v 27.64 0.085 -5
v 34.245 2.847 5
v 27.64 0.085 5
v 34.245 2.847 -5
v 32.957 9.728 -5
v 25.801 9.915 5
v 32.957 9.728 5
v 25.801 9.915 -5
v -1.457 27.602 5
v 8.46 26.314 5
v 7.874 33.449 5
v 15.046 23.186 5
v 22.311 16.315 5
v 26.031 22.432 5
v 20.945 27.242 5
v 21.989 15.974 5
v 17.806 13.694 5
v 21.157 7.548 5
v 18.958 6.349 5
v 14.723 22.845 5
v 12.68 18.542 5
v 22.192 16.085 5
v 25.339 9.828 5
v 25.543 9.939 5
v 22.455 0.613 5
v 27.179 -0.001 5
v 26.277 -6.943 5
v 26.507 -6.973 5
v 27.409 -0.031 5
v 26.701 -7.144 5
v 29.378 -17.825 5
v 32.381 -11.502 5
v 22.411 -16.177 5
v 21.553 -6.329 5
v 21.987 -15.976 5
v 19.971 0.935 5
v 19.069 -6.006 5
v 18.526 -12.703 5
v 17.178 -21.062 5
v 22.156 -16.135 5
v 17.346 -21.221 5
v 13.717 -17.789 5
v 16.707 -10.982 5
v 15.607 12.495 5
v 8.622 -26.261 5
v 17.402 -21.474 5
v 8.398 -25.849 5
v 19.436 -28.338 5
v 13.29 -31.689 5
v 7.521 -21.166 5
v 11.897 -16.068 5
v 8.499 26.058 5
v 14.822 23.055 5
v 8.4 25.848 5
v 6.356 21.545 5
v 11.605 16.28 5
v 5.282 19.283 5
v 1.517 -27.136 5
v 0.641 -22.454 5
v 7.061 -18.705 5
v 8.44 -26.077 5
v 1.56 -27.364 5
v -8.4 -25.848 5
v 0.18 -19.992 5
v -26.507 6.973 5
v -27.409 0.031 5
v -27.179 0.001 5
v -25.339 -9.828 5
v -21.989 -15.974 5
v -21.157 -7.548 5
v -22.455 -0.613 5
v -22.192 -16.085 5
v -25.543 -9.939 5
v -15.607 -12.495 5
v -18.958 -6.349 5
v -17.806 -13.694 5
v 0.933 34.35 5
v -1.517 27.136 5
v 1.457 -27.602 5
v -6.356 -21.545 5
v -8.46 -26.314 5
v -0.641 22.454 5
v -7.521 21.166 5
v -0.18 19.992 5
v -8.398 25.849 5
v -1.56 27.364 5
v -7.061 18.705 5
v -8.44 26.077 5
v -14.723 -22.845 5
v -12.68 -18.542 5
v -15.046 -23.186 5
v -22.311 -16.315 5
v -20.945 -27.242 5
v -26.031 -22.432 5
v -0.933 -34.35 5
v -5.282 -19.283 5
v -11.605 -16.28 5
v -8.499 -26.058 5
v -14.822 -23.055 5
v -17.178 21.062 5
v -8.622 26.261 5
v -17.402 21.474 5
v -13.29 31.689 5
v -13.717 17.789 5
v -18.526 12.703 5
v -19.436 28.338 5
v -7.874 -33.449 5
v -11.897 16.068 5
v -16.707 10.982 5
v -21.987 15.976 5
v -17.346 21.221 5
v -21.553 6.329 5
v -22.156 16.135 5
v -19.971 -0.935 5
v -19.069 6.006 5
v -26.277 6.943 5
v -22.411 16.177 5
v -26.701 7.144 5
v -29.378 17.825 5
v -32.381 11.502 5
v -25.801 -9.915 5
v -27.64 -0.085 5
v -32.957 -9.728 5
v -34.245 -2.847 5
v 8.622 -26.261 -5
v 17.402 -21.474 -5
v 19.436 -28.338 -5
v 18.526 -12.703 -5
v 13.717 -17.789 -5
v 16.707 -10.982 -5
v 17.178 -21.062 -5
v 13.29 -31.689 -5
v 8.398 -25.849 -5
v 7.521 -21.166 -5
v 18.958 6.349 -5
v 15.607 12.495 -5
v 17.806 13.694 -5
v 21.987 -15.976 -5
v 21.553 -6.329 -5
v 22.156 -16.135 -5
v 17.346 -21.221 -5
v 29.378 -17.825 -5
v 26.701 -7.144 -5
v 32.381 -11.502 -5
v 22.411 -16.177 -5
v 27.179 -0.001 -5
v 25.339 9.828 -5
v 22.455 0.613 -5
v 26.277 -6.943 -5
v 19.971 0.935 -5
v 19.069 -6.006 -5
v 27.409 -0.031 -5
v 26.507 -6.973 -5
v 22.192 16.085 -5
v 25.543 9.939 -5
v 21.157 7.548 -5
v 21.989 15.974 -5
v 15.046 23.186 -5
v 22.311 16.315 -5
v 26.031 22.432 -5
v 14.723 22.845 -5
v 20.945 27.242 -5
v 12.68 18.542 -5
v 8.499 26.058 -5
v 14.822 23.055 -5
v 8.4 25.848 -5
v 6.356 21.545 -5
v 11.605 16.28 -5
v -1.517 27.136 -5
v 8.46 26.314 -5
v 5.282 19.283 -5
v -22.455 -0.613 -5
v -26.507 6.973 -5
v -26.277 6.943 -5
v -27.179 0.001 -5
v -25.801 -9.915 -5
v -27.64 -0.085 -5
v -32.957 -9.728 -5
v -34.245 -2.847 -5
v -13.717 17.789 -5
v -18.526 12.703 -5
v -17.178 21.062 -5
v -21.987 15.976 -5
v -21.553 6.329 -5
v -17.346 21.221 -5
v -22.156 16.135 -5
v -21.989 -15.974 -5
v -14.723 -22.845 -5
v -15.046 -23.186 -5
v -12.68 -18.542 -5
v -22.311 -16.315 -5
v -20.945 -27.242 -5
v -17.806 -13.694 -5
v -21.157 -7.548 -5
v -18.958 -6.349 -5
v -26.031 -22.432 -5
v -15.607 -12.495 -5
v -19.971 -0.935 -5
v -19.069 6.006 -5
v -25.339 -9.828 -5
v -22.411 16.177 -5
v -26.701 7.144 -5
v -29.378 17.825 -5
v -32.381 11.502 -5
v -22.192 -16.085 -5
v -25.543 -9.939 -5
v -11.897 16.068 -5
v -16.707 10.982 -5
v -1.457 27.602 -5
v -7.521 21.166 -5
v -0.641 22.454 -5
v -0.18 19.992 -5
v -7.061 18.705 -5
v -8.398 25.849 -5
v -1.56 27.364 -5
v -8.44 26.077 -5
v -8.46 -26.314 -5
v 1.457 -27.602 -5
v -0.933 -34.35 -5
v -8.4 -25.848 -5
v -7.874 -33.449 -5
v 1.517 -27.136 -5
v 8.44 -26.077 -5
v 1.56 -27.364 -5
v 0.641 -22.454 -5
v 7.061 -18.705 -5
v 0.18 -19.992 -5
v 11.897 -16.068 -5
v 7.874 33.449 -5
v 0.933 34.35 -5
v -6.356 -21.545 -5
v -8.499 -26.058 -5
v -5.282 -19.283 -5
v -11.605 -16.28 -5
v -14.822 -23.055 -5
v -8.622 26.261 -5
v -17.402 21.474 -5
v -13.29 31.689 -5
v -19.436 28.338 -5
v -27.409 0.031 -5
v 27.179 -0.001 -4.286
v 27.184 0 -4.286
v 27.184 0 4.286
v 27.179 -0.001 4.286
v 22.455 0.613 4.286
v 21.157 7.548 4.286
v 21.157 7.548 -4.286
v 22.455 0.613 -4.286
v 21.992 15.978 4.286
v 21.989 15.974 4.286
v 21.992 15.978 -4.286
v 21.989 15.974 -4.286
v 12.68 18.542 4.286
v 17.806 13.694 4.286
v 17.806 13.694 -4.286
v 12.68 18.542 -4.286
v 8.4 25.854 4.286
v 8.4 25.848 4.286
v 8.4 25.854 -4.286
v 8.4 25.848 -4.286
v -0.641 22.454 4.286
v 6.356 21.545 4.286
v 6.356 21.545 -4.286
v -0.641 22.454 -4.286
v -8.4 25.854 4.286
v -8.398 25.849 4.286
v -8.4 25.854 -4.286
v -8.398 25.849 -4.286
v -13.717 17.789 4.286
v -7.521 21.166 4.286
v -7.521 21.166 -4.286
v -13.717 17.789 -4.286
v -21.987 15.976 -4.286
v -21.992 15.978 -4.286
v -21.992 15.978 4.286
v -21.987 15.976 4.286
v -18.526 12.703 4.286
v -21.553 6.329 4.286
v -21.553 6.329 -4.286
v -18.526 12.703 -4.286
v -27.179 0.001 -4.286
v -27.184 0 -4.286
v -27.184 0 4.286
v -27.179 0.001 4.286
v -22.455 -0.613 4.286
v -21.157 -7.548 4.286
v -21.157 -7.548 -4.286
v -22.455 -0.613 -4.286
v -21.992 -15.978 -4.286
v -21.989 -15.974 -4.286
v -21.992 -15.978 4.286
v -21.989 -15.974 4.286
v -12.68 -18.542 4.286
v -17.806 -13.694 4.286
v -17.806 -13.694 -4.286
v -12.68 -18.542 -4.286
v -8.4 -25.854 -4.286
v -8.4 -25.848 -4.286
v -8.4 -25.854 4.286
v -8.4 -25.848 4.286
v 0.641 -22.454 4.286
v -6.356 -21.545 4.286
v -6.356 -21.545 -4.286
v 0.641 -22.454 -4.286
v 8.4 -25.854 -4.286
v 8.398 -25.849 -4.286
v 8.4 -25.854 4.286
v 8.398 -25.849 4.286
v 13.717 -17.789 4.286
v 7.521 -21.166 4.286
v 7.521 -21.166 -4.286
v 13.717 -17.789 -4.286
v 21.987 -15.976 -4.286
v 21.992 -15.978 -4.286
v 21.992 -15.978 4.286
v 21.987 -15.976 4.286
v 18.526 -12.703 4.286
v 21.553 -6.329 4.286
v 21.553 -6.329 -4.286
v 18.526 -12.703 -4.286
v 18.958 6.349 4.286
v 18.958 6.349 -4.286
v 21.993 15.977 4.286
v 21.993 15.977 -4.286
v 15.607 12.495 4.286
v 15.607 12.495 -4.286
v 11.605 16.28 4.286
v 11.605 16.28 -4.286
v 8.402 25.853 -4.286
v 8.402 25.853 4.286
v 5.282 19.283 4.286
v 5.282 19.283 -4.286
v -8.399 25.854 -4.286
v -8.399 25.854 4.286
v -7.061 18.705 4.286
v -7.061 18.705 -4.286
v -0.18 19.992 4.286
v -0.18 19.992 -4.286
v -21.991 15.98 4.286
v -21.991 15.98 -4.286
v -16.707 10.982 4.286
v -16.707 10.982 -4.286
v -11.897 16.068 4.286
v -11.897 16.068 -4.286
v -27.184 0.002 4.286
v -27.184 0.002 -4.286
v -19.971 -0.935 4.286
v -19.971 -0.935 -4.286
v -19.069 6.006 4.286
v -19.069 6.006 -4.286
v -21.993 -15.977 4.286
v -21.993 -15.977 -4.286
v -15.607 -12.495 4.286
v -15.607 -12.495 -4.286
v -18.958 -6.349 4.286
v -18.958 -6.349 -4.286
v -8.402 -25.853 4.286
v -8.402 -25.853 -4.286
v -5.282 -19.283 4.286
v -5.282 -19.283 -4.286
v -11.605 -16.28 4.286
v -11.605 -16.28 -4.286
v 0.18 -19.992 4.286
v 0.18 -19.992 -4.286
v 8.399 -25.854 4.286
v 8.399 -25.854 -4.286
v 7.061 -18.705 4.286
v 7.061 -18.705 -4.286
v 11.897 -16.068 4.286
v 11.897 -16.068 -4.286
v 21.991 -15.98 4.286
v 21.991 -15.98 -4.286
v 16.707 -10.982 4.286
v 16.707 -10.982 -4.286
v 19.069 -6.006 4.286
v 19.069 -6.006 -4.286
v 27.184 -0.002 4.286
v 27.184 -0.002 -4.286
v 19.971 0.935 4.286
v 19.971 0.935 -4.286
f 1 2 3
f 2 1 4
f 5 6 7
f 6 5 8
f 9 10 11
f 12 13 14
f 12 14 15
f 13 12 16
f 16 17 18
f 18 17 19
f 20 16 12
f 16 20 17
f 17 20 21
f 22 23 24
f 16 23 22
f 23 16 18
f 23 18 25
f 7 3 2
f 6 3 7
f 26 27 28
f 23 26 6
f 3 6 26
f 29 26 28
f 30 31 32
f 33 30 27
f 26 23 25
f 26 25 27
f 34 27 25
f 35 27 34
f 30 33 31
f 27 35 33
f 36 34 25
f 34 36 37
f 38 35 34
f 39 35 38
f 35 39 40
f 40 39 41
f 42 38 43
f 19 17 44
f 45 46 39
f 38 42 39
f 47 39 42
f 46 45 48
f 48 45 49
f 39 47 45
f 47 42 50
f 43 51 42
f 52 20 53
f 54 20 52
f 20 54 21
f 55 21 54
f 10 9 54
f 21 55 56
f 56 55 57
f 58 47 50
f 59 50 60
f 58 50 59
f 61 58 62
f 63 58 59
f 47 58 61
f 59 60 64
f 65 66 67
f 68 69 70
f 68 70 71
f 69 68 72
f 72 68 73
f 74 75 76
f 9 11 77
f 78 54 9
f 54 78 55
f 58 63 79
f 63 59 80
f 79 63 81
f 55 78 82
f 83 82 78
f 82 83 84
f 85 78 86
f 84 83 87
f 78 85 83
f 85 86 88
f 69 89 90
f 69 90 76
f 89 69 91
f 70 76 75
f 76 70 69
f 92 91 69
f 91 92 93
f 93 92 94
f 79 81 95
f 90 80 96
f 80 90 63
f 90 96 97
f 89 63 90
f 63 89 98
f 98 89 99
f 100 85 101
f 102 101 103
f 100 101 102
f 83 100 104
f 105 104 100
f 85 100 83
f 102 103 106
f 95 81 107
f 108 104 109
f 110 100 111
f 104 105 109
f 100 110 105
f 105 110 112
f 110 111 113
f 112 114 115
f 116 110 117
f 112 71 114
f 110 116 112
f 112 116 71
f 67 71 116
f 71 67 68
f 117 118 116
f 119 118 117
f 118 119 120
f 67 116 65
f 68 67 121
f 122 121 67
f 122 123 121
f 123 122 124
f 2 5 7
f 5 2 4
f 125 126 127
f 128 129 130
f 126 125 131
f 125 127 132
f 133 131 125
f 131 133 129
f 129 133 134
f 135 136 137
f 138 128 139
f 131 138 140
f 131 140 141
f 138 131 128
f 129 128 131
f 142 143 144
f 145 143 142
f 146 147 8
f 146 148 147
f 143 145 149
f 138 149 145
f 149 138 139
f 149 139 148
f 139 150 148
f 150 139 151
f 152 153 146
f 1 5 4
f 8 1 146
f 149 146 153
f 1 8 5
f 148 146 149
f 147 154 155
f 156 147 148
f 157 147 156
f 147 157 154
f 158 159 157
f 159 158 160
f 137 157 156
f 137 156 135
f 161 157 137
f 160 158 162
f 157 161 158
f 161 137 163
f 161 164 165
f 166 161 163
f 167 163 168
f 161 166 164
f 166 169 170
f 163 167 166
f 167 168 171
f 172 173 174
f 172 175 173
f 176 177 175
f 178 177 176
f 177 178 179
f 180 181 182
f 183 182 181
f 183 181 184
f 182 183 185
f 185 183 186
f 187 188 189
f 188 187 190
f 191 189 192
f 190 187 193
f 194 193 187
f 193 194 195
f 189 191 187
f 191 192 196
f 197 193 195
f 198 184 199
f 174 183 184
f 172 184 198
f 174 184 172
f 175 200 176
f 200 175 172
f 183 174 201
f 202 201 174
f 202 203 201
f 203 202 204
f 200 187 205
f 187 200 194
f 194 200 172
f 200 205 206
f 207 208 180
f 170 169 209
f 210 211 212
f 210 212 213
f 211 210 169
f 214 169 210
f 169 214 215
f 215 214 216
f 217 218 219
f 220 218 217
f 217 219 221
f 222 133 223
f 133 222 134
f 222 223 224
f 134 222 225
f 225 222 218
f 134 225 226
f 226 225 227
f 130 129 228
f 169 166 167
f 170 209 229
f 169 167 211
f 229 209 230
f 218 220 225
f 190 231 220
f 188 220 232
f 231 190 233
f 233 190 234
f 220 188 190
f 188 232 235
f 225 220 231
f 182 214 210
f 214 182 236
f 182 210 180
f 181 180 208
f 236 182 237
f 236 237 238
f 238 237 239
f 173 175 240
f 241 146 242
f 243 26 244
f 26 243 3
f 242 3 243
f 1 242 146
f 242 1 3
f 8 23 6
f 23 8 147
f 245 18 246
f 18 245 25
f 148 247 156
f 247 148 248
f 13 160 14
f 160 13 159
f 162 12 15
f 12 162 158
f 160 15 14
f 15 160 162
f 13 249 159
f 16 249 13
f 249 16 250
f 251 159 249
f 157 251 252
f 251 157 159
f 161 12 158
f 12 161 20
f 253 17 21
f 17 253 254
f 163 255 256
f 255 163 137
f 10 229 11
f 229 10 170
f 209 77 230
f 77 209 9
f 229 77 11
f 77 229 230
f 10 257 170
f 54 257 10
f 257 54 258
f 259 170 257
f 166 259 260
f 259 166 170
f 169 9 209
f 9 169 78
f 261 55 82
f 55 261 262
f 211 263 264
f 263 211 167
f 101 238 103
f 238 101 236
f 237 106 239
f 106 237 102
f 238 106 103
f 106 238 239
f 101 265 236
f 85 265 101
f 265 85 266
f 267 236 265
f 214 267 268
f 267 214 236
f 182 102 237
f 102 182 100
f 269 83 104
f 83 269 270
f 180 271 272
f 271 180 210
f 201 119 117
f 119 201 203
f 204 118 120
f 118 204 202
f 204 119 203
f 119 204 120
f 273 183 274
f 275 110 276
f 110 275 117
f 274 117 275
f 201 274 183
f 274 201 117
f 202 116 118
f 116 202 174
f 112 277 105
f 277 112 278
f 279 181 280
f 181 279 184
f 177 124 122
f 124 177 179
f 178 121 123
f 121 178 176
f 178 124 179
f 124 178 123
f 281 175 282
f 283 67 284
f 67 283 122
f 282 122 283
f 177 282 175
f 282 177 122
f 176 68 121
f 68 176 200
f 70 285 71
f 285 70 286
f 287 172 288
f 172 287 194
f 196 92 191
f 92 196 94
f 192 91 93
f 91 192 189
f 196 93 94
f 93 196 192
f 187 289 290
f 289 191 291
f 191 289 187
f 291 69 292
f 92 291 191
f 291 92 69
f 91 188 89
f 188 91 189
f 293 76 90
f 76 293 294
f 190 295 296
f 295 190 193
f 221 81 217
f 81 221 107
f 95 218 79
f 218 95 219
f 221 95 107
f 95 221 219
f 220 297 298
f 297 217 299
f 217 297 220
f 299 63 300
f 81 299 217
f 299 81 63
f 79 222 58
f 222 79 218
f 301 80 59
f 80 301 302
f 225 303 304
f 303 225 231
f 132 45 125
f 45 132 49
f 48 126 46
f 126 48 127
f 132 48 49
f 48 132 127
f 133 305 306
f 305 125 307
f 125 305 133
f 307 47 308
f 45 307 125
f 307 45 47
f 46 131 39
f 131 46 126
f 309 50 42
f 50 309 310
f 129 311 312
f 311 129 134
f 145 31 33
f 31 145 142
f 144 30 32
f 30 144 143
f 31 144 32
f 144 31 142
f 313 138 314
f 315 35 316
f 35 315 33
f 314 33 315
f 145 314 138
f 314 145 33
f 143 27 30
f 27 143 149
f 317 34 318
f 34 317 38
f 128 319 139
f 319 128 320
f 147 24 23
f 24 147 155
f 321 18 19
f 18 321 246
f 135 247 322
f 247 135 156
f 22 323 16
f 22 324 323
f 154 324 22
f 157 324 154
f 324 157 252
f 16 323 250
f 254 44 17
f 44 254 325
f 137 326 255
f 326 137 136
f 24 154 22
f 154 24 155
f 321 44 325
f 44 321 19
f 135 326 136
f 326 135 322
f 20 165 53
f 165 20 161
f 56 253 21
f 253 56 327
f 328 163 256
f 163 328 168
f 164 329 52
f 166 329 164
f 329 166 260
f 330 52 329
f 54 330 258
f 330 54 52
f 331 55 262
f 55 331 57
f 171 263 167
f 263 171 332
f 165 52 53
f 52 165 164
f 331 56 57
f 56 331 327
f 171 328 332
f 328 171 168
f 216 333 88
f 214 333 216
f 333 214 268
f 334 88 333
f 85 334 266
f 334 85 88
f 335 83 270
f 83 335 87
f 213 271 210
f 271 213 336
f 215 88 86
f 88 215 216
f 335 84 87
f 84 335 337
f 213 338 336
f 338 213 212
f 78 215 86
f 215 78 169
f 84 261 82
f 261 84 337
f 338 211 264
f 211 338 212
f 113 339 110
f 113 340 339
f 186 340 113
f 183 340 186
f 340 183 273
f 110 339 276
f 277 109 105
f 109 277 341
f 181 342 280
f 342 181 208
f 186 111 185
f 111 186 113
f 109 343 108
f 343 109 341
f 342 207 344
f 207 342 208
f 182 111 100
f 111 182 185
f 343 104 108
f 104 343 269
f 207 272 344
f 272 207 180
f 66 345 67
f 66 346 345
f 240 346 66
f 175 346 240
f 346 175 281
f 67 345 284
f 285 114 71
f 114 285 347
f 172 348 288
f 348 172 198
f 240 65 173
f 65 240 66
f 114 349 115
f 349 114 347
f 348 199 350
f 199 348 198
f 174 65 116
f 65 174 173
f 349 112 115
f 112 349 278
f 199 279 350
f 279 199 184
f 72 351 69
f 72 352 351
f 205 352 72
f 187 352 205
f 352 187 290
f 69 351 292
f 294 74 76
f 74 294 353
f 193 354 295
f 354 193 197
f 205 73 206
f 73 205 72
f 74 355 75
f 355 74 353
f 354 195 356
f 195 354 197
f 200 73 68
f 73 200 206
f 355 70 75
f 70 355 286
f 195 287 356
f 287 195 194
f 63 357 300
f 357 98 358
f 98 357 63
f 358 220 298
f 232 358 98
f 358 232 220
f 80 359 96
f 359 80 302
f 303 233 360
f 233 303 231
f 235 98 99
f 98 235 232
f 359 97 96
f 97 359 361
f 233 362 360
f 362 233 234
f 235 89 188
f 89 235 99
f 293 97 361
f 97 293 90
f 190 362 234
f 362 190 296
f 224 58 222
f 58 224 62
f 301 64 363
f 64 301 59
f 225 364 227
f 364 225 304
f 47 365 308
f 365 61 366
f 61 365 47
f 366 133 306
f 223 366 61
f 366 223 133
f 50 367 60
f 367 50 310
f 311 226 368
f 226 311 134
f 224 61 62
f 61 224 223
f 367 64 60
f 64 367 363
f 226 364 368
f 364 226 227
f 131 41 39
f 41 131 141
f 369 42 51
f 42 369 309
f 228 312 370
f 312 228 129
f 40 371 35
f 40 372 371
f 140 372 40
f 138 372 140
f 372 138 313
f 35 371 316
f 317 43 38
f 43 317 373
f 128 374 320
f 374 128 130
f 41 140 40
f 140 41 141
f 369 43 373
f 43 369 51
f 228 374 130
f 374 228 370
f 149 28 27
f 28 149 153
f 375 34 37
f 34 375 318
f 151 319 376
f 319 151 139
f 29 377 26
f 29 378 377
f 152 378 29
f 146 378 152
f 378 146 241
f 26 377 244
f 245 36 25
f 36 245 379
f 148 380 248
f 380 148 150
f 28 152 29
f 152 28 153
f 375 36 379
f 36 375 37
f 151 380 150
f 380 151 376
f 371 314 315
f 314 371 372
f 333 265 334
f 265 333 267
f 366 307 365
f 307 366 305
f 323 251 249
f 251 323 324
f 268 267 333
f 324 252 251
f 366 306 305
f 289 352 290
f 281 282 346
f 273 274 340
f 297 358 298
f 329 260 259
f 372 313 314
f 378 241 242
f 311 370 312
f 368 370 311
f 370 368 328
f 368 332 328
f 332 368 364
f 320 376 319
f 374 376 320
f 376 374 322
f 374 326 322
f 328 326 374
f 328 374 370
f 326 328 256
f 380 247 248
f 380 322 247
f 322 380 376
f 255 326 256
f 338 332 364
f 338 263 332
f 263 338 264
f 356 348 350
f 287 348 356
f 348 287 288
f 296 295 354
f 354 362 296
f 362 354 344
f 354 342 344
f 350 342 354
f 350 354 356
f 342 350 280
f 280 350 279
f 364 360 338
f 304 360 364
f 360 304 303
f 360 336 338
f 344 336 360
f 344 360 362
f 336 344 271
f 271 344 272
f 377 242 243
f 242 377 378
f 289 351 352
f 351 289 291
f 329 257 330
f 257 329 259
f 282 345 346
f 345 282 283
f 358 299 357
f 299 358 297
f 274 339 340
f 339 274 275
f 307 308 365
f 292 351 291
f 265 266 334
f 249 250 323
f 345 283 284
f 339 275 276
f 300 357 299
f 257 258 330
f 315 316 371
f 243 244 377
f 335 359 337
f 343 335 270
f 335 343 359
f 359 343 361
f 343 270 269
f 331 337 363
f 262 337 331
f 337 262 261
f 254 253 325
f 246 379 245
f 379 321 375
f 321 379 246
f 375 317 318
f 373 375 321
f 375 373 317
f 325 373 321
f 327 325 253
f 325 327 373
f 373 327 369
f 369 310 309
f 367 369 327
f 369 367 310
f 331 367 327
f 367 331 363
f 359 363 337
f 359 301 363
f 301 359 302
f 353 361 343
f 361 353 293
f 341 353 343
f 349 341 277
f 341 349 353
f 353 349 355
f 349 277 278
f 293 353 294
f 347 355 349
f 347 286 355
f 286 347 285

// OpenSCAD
function trapezoid(wid1, wid2, height) = [
    [-wid1/2, -height/2],
    [ wid1/2, -height/2],
    [ wid2/2,  height/2],
    [-wid2/2,  height/2],
    [-wid1/2, -height/2]
];

pi = 3.141592653589793;

sides=10;

tooth_base_width=10;
tooth_peak_width=7;
tooth_height=7;
gear_thickness=10;

module tooth(base_width, peak_width, height, thickness) {
    union() {
        linear_extrude(height=thickness, center=true)
            polygon(
                trapezoid(base_width, peak_width, height)
            );
            translate([0, -height/2-thickness/4, 0])
                cube([base_width, thickness/2, thickness], center=true);
    };
}

module gear(tooth_base_width, tooth_peak_width, tooth_height, thickness, tooth_count) {
    
    theta=360/tooth_count;
    phi=(180-tooth_count)/2;

    tooth_section_width = tooth_base_width + tooth_peak_width;

    r = tooth_section_width * sin(phi) / sin(theta) * 0.9435;

    theta1 = 2*asin(tooth_base_width/(2*r));
    theta2prime = 2*asin(tooth_peak_width/(2*r));
    theta2 = theta - theta1;
    delta = theta - (theta1+theta2prime);
    
    echo(r, theta2, theta2prime, delta);

   union() {
       for (i = [0:tooth_count]) {
           toothangle = i*theta + theta1/2;
           dx1 = (r+tooth_height/2)*cos(toothangle);
           dy1 = (r+tooth_height/2)*sin(toothangle);
           translate([dx1, dy1, 0])
               rotate([0, 0, toothangle-90])
                   tooth(tooth_base_width, tooth_peak_width, tooth_height, gear_thickness);
           flatangle = i*theta + theta1 + theta2/2;
           dx2 = (r-thickness*3/4/2)*cos(flatangle);
           dy2 = (r-thickness*3/4/2)*sin(flatangle);
           translate([dx2, dy2, 0])
               rotate([0, 0, flatangle-90])
                   cube([tooth_peak_width, thickness*3/4, thickness], center=true);
       }
       cylinder(h=6*gear_thickness/7, r1=r, r2=r, center=true, $fn=90);
   }    
}

gear(tooth_base_width, tooth_peak_width, tooth_height, gear_thickness, sides);
